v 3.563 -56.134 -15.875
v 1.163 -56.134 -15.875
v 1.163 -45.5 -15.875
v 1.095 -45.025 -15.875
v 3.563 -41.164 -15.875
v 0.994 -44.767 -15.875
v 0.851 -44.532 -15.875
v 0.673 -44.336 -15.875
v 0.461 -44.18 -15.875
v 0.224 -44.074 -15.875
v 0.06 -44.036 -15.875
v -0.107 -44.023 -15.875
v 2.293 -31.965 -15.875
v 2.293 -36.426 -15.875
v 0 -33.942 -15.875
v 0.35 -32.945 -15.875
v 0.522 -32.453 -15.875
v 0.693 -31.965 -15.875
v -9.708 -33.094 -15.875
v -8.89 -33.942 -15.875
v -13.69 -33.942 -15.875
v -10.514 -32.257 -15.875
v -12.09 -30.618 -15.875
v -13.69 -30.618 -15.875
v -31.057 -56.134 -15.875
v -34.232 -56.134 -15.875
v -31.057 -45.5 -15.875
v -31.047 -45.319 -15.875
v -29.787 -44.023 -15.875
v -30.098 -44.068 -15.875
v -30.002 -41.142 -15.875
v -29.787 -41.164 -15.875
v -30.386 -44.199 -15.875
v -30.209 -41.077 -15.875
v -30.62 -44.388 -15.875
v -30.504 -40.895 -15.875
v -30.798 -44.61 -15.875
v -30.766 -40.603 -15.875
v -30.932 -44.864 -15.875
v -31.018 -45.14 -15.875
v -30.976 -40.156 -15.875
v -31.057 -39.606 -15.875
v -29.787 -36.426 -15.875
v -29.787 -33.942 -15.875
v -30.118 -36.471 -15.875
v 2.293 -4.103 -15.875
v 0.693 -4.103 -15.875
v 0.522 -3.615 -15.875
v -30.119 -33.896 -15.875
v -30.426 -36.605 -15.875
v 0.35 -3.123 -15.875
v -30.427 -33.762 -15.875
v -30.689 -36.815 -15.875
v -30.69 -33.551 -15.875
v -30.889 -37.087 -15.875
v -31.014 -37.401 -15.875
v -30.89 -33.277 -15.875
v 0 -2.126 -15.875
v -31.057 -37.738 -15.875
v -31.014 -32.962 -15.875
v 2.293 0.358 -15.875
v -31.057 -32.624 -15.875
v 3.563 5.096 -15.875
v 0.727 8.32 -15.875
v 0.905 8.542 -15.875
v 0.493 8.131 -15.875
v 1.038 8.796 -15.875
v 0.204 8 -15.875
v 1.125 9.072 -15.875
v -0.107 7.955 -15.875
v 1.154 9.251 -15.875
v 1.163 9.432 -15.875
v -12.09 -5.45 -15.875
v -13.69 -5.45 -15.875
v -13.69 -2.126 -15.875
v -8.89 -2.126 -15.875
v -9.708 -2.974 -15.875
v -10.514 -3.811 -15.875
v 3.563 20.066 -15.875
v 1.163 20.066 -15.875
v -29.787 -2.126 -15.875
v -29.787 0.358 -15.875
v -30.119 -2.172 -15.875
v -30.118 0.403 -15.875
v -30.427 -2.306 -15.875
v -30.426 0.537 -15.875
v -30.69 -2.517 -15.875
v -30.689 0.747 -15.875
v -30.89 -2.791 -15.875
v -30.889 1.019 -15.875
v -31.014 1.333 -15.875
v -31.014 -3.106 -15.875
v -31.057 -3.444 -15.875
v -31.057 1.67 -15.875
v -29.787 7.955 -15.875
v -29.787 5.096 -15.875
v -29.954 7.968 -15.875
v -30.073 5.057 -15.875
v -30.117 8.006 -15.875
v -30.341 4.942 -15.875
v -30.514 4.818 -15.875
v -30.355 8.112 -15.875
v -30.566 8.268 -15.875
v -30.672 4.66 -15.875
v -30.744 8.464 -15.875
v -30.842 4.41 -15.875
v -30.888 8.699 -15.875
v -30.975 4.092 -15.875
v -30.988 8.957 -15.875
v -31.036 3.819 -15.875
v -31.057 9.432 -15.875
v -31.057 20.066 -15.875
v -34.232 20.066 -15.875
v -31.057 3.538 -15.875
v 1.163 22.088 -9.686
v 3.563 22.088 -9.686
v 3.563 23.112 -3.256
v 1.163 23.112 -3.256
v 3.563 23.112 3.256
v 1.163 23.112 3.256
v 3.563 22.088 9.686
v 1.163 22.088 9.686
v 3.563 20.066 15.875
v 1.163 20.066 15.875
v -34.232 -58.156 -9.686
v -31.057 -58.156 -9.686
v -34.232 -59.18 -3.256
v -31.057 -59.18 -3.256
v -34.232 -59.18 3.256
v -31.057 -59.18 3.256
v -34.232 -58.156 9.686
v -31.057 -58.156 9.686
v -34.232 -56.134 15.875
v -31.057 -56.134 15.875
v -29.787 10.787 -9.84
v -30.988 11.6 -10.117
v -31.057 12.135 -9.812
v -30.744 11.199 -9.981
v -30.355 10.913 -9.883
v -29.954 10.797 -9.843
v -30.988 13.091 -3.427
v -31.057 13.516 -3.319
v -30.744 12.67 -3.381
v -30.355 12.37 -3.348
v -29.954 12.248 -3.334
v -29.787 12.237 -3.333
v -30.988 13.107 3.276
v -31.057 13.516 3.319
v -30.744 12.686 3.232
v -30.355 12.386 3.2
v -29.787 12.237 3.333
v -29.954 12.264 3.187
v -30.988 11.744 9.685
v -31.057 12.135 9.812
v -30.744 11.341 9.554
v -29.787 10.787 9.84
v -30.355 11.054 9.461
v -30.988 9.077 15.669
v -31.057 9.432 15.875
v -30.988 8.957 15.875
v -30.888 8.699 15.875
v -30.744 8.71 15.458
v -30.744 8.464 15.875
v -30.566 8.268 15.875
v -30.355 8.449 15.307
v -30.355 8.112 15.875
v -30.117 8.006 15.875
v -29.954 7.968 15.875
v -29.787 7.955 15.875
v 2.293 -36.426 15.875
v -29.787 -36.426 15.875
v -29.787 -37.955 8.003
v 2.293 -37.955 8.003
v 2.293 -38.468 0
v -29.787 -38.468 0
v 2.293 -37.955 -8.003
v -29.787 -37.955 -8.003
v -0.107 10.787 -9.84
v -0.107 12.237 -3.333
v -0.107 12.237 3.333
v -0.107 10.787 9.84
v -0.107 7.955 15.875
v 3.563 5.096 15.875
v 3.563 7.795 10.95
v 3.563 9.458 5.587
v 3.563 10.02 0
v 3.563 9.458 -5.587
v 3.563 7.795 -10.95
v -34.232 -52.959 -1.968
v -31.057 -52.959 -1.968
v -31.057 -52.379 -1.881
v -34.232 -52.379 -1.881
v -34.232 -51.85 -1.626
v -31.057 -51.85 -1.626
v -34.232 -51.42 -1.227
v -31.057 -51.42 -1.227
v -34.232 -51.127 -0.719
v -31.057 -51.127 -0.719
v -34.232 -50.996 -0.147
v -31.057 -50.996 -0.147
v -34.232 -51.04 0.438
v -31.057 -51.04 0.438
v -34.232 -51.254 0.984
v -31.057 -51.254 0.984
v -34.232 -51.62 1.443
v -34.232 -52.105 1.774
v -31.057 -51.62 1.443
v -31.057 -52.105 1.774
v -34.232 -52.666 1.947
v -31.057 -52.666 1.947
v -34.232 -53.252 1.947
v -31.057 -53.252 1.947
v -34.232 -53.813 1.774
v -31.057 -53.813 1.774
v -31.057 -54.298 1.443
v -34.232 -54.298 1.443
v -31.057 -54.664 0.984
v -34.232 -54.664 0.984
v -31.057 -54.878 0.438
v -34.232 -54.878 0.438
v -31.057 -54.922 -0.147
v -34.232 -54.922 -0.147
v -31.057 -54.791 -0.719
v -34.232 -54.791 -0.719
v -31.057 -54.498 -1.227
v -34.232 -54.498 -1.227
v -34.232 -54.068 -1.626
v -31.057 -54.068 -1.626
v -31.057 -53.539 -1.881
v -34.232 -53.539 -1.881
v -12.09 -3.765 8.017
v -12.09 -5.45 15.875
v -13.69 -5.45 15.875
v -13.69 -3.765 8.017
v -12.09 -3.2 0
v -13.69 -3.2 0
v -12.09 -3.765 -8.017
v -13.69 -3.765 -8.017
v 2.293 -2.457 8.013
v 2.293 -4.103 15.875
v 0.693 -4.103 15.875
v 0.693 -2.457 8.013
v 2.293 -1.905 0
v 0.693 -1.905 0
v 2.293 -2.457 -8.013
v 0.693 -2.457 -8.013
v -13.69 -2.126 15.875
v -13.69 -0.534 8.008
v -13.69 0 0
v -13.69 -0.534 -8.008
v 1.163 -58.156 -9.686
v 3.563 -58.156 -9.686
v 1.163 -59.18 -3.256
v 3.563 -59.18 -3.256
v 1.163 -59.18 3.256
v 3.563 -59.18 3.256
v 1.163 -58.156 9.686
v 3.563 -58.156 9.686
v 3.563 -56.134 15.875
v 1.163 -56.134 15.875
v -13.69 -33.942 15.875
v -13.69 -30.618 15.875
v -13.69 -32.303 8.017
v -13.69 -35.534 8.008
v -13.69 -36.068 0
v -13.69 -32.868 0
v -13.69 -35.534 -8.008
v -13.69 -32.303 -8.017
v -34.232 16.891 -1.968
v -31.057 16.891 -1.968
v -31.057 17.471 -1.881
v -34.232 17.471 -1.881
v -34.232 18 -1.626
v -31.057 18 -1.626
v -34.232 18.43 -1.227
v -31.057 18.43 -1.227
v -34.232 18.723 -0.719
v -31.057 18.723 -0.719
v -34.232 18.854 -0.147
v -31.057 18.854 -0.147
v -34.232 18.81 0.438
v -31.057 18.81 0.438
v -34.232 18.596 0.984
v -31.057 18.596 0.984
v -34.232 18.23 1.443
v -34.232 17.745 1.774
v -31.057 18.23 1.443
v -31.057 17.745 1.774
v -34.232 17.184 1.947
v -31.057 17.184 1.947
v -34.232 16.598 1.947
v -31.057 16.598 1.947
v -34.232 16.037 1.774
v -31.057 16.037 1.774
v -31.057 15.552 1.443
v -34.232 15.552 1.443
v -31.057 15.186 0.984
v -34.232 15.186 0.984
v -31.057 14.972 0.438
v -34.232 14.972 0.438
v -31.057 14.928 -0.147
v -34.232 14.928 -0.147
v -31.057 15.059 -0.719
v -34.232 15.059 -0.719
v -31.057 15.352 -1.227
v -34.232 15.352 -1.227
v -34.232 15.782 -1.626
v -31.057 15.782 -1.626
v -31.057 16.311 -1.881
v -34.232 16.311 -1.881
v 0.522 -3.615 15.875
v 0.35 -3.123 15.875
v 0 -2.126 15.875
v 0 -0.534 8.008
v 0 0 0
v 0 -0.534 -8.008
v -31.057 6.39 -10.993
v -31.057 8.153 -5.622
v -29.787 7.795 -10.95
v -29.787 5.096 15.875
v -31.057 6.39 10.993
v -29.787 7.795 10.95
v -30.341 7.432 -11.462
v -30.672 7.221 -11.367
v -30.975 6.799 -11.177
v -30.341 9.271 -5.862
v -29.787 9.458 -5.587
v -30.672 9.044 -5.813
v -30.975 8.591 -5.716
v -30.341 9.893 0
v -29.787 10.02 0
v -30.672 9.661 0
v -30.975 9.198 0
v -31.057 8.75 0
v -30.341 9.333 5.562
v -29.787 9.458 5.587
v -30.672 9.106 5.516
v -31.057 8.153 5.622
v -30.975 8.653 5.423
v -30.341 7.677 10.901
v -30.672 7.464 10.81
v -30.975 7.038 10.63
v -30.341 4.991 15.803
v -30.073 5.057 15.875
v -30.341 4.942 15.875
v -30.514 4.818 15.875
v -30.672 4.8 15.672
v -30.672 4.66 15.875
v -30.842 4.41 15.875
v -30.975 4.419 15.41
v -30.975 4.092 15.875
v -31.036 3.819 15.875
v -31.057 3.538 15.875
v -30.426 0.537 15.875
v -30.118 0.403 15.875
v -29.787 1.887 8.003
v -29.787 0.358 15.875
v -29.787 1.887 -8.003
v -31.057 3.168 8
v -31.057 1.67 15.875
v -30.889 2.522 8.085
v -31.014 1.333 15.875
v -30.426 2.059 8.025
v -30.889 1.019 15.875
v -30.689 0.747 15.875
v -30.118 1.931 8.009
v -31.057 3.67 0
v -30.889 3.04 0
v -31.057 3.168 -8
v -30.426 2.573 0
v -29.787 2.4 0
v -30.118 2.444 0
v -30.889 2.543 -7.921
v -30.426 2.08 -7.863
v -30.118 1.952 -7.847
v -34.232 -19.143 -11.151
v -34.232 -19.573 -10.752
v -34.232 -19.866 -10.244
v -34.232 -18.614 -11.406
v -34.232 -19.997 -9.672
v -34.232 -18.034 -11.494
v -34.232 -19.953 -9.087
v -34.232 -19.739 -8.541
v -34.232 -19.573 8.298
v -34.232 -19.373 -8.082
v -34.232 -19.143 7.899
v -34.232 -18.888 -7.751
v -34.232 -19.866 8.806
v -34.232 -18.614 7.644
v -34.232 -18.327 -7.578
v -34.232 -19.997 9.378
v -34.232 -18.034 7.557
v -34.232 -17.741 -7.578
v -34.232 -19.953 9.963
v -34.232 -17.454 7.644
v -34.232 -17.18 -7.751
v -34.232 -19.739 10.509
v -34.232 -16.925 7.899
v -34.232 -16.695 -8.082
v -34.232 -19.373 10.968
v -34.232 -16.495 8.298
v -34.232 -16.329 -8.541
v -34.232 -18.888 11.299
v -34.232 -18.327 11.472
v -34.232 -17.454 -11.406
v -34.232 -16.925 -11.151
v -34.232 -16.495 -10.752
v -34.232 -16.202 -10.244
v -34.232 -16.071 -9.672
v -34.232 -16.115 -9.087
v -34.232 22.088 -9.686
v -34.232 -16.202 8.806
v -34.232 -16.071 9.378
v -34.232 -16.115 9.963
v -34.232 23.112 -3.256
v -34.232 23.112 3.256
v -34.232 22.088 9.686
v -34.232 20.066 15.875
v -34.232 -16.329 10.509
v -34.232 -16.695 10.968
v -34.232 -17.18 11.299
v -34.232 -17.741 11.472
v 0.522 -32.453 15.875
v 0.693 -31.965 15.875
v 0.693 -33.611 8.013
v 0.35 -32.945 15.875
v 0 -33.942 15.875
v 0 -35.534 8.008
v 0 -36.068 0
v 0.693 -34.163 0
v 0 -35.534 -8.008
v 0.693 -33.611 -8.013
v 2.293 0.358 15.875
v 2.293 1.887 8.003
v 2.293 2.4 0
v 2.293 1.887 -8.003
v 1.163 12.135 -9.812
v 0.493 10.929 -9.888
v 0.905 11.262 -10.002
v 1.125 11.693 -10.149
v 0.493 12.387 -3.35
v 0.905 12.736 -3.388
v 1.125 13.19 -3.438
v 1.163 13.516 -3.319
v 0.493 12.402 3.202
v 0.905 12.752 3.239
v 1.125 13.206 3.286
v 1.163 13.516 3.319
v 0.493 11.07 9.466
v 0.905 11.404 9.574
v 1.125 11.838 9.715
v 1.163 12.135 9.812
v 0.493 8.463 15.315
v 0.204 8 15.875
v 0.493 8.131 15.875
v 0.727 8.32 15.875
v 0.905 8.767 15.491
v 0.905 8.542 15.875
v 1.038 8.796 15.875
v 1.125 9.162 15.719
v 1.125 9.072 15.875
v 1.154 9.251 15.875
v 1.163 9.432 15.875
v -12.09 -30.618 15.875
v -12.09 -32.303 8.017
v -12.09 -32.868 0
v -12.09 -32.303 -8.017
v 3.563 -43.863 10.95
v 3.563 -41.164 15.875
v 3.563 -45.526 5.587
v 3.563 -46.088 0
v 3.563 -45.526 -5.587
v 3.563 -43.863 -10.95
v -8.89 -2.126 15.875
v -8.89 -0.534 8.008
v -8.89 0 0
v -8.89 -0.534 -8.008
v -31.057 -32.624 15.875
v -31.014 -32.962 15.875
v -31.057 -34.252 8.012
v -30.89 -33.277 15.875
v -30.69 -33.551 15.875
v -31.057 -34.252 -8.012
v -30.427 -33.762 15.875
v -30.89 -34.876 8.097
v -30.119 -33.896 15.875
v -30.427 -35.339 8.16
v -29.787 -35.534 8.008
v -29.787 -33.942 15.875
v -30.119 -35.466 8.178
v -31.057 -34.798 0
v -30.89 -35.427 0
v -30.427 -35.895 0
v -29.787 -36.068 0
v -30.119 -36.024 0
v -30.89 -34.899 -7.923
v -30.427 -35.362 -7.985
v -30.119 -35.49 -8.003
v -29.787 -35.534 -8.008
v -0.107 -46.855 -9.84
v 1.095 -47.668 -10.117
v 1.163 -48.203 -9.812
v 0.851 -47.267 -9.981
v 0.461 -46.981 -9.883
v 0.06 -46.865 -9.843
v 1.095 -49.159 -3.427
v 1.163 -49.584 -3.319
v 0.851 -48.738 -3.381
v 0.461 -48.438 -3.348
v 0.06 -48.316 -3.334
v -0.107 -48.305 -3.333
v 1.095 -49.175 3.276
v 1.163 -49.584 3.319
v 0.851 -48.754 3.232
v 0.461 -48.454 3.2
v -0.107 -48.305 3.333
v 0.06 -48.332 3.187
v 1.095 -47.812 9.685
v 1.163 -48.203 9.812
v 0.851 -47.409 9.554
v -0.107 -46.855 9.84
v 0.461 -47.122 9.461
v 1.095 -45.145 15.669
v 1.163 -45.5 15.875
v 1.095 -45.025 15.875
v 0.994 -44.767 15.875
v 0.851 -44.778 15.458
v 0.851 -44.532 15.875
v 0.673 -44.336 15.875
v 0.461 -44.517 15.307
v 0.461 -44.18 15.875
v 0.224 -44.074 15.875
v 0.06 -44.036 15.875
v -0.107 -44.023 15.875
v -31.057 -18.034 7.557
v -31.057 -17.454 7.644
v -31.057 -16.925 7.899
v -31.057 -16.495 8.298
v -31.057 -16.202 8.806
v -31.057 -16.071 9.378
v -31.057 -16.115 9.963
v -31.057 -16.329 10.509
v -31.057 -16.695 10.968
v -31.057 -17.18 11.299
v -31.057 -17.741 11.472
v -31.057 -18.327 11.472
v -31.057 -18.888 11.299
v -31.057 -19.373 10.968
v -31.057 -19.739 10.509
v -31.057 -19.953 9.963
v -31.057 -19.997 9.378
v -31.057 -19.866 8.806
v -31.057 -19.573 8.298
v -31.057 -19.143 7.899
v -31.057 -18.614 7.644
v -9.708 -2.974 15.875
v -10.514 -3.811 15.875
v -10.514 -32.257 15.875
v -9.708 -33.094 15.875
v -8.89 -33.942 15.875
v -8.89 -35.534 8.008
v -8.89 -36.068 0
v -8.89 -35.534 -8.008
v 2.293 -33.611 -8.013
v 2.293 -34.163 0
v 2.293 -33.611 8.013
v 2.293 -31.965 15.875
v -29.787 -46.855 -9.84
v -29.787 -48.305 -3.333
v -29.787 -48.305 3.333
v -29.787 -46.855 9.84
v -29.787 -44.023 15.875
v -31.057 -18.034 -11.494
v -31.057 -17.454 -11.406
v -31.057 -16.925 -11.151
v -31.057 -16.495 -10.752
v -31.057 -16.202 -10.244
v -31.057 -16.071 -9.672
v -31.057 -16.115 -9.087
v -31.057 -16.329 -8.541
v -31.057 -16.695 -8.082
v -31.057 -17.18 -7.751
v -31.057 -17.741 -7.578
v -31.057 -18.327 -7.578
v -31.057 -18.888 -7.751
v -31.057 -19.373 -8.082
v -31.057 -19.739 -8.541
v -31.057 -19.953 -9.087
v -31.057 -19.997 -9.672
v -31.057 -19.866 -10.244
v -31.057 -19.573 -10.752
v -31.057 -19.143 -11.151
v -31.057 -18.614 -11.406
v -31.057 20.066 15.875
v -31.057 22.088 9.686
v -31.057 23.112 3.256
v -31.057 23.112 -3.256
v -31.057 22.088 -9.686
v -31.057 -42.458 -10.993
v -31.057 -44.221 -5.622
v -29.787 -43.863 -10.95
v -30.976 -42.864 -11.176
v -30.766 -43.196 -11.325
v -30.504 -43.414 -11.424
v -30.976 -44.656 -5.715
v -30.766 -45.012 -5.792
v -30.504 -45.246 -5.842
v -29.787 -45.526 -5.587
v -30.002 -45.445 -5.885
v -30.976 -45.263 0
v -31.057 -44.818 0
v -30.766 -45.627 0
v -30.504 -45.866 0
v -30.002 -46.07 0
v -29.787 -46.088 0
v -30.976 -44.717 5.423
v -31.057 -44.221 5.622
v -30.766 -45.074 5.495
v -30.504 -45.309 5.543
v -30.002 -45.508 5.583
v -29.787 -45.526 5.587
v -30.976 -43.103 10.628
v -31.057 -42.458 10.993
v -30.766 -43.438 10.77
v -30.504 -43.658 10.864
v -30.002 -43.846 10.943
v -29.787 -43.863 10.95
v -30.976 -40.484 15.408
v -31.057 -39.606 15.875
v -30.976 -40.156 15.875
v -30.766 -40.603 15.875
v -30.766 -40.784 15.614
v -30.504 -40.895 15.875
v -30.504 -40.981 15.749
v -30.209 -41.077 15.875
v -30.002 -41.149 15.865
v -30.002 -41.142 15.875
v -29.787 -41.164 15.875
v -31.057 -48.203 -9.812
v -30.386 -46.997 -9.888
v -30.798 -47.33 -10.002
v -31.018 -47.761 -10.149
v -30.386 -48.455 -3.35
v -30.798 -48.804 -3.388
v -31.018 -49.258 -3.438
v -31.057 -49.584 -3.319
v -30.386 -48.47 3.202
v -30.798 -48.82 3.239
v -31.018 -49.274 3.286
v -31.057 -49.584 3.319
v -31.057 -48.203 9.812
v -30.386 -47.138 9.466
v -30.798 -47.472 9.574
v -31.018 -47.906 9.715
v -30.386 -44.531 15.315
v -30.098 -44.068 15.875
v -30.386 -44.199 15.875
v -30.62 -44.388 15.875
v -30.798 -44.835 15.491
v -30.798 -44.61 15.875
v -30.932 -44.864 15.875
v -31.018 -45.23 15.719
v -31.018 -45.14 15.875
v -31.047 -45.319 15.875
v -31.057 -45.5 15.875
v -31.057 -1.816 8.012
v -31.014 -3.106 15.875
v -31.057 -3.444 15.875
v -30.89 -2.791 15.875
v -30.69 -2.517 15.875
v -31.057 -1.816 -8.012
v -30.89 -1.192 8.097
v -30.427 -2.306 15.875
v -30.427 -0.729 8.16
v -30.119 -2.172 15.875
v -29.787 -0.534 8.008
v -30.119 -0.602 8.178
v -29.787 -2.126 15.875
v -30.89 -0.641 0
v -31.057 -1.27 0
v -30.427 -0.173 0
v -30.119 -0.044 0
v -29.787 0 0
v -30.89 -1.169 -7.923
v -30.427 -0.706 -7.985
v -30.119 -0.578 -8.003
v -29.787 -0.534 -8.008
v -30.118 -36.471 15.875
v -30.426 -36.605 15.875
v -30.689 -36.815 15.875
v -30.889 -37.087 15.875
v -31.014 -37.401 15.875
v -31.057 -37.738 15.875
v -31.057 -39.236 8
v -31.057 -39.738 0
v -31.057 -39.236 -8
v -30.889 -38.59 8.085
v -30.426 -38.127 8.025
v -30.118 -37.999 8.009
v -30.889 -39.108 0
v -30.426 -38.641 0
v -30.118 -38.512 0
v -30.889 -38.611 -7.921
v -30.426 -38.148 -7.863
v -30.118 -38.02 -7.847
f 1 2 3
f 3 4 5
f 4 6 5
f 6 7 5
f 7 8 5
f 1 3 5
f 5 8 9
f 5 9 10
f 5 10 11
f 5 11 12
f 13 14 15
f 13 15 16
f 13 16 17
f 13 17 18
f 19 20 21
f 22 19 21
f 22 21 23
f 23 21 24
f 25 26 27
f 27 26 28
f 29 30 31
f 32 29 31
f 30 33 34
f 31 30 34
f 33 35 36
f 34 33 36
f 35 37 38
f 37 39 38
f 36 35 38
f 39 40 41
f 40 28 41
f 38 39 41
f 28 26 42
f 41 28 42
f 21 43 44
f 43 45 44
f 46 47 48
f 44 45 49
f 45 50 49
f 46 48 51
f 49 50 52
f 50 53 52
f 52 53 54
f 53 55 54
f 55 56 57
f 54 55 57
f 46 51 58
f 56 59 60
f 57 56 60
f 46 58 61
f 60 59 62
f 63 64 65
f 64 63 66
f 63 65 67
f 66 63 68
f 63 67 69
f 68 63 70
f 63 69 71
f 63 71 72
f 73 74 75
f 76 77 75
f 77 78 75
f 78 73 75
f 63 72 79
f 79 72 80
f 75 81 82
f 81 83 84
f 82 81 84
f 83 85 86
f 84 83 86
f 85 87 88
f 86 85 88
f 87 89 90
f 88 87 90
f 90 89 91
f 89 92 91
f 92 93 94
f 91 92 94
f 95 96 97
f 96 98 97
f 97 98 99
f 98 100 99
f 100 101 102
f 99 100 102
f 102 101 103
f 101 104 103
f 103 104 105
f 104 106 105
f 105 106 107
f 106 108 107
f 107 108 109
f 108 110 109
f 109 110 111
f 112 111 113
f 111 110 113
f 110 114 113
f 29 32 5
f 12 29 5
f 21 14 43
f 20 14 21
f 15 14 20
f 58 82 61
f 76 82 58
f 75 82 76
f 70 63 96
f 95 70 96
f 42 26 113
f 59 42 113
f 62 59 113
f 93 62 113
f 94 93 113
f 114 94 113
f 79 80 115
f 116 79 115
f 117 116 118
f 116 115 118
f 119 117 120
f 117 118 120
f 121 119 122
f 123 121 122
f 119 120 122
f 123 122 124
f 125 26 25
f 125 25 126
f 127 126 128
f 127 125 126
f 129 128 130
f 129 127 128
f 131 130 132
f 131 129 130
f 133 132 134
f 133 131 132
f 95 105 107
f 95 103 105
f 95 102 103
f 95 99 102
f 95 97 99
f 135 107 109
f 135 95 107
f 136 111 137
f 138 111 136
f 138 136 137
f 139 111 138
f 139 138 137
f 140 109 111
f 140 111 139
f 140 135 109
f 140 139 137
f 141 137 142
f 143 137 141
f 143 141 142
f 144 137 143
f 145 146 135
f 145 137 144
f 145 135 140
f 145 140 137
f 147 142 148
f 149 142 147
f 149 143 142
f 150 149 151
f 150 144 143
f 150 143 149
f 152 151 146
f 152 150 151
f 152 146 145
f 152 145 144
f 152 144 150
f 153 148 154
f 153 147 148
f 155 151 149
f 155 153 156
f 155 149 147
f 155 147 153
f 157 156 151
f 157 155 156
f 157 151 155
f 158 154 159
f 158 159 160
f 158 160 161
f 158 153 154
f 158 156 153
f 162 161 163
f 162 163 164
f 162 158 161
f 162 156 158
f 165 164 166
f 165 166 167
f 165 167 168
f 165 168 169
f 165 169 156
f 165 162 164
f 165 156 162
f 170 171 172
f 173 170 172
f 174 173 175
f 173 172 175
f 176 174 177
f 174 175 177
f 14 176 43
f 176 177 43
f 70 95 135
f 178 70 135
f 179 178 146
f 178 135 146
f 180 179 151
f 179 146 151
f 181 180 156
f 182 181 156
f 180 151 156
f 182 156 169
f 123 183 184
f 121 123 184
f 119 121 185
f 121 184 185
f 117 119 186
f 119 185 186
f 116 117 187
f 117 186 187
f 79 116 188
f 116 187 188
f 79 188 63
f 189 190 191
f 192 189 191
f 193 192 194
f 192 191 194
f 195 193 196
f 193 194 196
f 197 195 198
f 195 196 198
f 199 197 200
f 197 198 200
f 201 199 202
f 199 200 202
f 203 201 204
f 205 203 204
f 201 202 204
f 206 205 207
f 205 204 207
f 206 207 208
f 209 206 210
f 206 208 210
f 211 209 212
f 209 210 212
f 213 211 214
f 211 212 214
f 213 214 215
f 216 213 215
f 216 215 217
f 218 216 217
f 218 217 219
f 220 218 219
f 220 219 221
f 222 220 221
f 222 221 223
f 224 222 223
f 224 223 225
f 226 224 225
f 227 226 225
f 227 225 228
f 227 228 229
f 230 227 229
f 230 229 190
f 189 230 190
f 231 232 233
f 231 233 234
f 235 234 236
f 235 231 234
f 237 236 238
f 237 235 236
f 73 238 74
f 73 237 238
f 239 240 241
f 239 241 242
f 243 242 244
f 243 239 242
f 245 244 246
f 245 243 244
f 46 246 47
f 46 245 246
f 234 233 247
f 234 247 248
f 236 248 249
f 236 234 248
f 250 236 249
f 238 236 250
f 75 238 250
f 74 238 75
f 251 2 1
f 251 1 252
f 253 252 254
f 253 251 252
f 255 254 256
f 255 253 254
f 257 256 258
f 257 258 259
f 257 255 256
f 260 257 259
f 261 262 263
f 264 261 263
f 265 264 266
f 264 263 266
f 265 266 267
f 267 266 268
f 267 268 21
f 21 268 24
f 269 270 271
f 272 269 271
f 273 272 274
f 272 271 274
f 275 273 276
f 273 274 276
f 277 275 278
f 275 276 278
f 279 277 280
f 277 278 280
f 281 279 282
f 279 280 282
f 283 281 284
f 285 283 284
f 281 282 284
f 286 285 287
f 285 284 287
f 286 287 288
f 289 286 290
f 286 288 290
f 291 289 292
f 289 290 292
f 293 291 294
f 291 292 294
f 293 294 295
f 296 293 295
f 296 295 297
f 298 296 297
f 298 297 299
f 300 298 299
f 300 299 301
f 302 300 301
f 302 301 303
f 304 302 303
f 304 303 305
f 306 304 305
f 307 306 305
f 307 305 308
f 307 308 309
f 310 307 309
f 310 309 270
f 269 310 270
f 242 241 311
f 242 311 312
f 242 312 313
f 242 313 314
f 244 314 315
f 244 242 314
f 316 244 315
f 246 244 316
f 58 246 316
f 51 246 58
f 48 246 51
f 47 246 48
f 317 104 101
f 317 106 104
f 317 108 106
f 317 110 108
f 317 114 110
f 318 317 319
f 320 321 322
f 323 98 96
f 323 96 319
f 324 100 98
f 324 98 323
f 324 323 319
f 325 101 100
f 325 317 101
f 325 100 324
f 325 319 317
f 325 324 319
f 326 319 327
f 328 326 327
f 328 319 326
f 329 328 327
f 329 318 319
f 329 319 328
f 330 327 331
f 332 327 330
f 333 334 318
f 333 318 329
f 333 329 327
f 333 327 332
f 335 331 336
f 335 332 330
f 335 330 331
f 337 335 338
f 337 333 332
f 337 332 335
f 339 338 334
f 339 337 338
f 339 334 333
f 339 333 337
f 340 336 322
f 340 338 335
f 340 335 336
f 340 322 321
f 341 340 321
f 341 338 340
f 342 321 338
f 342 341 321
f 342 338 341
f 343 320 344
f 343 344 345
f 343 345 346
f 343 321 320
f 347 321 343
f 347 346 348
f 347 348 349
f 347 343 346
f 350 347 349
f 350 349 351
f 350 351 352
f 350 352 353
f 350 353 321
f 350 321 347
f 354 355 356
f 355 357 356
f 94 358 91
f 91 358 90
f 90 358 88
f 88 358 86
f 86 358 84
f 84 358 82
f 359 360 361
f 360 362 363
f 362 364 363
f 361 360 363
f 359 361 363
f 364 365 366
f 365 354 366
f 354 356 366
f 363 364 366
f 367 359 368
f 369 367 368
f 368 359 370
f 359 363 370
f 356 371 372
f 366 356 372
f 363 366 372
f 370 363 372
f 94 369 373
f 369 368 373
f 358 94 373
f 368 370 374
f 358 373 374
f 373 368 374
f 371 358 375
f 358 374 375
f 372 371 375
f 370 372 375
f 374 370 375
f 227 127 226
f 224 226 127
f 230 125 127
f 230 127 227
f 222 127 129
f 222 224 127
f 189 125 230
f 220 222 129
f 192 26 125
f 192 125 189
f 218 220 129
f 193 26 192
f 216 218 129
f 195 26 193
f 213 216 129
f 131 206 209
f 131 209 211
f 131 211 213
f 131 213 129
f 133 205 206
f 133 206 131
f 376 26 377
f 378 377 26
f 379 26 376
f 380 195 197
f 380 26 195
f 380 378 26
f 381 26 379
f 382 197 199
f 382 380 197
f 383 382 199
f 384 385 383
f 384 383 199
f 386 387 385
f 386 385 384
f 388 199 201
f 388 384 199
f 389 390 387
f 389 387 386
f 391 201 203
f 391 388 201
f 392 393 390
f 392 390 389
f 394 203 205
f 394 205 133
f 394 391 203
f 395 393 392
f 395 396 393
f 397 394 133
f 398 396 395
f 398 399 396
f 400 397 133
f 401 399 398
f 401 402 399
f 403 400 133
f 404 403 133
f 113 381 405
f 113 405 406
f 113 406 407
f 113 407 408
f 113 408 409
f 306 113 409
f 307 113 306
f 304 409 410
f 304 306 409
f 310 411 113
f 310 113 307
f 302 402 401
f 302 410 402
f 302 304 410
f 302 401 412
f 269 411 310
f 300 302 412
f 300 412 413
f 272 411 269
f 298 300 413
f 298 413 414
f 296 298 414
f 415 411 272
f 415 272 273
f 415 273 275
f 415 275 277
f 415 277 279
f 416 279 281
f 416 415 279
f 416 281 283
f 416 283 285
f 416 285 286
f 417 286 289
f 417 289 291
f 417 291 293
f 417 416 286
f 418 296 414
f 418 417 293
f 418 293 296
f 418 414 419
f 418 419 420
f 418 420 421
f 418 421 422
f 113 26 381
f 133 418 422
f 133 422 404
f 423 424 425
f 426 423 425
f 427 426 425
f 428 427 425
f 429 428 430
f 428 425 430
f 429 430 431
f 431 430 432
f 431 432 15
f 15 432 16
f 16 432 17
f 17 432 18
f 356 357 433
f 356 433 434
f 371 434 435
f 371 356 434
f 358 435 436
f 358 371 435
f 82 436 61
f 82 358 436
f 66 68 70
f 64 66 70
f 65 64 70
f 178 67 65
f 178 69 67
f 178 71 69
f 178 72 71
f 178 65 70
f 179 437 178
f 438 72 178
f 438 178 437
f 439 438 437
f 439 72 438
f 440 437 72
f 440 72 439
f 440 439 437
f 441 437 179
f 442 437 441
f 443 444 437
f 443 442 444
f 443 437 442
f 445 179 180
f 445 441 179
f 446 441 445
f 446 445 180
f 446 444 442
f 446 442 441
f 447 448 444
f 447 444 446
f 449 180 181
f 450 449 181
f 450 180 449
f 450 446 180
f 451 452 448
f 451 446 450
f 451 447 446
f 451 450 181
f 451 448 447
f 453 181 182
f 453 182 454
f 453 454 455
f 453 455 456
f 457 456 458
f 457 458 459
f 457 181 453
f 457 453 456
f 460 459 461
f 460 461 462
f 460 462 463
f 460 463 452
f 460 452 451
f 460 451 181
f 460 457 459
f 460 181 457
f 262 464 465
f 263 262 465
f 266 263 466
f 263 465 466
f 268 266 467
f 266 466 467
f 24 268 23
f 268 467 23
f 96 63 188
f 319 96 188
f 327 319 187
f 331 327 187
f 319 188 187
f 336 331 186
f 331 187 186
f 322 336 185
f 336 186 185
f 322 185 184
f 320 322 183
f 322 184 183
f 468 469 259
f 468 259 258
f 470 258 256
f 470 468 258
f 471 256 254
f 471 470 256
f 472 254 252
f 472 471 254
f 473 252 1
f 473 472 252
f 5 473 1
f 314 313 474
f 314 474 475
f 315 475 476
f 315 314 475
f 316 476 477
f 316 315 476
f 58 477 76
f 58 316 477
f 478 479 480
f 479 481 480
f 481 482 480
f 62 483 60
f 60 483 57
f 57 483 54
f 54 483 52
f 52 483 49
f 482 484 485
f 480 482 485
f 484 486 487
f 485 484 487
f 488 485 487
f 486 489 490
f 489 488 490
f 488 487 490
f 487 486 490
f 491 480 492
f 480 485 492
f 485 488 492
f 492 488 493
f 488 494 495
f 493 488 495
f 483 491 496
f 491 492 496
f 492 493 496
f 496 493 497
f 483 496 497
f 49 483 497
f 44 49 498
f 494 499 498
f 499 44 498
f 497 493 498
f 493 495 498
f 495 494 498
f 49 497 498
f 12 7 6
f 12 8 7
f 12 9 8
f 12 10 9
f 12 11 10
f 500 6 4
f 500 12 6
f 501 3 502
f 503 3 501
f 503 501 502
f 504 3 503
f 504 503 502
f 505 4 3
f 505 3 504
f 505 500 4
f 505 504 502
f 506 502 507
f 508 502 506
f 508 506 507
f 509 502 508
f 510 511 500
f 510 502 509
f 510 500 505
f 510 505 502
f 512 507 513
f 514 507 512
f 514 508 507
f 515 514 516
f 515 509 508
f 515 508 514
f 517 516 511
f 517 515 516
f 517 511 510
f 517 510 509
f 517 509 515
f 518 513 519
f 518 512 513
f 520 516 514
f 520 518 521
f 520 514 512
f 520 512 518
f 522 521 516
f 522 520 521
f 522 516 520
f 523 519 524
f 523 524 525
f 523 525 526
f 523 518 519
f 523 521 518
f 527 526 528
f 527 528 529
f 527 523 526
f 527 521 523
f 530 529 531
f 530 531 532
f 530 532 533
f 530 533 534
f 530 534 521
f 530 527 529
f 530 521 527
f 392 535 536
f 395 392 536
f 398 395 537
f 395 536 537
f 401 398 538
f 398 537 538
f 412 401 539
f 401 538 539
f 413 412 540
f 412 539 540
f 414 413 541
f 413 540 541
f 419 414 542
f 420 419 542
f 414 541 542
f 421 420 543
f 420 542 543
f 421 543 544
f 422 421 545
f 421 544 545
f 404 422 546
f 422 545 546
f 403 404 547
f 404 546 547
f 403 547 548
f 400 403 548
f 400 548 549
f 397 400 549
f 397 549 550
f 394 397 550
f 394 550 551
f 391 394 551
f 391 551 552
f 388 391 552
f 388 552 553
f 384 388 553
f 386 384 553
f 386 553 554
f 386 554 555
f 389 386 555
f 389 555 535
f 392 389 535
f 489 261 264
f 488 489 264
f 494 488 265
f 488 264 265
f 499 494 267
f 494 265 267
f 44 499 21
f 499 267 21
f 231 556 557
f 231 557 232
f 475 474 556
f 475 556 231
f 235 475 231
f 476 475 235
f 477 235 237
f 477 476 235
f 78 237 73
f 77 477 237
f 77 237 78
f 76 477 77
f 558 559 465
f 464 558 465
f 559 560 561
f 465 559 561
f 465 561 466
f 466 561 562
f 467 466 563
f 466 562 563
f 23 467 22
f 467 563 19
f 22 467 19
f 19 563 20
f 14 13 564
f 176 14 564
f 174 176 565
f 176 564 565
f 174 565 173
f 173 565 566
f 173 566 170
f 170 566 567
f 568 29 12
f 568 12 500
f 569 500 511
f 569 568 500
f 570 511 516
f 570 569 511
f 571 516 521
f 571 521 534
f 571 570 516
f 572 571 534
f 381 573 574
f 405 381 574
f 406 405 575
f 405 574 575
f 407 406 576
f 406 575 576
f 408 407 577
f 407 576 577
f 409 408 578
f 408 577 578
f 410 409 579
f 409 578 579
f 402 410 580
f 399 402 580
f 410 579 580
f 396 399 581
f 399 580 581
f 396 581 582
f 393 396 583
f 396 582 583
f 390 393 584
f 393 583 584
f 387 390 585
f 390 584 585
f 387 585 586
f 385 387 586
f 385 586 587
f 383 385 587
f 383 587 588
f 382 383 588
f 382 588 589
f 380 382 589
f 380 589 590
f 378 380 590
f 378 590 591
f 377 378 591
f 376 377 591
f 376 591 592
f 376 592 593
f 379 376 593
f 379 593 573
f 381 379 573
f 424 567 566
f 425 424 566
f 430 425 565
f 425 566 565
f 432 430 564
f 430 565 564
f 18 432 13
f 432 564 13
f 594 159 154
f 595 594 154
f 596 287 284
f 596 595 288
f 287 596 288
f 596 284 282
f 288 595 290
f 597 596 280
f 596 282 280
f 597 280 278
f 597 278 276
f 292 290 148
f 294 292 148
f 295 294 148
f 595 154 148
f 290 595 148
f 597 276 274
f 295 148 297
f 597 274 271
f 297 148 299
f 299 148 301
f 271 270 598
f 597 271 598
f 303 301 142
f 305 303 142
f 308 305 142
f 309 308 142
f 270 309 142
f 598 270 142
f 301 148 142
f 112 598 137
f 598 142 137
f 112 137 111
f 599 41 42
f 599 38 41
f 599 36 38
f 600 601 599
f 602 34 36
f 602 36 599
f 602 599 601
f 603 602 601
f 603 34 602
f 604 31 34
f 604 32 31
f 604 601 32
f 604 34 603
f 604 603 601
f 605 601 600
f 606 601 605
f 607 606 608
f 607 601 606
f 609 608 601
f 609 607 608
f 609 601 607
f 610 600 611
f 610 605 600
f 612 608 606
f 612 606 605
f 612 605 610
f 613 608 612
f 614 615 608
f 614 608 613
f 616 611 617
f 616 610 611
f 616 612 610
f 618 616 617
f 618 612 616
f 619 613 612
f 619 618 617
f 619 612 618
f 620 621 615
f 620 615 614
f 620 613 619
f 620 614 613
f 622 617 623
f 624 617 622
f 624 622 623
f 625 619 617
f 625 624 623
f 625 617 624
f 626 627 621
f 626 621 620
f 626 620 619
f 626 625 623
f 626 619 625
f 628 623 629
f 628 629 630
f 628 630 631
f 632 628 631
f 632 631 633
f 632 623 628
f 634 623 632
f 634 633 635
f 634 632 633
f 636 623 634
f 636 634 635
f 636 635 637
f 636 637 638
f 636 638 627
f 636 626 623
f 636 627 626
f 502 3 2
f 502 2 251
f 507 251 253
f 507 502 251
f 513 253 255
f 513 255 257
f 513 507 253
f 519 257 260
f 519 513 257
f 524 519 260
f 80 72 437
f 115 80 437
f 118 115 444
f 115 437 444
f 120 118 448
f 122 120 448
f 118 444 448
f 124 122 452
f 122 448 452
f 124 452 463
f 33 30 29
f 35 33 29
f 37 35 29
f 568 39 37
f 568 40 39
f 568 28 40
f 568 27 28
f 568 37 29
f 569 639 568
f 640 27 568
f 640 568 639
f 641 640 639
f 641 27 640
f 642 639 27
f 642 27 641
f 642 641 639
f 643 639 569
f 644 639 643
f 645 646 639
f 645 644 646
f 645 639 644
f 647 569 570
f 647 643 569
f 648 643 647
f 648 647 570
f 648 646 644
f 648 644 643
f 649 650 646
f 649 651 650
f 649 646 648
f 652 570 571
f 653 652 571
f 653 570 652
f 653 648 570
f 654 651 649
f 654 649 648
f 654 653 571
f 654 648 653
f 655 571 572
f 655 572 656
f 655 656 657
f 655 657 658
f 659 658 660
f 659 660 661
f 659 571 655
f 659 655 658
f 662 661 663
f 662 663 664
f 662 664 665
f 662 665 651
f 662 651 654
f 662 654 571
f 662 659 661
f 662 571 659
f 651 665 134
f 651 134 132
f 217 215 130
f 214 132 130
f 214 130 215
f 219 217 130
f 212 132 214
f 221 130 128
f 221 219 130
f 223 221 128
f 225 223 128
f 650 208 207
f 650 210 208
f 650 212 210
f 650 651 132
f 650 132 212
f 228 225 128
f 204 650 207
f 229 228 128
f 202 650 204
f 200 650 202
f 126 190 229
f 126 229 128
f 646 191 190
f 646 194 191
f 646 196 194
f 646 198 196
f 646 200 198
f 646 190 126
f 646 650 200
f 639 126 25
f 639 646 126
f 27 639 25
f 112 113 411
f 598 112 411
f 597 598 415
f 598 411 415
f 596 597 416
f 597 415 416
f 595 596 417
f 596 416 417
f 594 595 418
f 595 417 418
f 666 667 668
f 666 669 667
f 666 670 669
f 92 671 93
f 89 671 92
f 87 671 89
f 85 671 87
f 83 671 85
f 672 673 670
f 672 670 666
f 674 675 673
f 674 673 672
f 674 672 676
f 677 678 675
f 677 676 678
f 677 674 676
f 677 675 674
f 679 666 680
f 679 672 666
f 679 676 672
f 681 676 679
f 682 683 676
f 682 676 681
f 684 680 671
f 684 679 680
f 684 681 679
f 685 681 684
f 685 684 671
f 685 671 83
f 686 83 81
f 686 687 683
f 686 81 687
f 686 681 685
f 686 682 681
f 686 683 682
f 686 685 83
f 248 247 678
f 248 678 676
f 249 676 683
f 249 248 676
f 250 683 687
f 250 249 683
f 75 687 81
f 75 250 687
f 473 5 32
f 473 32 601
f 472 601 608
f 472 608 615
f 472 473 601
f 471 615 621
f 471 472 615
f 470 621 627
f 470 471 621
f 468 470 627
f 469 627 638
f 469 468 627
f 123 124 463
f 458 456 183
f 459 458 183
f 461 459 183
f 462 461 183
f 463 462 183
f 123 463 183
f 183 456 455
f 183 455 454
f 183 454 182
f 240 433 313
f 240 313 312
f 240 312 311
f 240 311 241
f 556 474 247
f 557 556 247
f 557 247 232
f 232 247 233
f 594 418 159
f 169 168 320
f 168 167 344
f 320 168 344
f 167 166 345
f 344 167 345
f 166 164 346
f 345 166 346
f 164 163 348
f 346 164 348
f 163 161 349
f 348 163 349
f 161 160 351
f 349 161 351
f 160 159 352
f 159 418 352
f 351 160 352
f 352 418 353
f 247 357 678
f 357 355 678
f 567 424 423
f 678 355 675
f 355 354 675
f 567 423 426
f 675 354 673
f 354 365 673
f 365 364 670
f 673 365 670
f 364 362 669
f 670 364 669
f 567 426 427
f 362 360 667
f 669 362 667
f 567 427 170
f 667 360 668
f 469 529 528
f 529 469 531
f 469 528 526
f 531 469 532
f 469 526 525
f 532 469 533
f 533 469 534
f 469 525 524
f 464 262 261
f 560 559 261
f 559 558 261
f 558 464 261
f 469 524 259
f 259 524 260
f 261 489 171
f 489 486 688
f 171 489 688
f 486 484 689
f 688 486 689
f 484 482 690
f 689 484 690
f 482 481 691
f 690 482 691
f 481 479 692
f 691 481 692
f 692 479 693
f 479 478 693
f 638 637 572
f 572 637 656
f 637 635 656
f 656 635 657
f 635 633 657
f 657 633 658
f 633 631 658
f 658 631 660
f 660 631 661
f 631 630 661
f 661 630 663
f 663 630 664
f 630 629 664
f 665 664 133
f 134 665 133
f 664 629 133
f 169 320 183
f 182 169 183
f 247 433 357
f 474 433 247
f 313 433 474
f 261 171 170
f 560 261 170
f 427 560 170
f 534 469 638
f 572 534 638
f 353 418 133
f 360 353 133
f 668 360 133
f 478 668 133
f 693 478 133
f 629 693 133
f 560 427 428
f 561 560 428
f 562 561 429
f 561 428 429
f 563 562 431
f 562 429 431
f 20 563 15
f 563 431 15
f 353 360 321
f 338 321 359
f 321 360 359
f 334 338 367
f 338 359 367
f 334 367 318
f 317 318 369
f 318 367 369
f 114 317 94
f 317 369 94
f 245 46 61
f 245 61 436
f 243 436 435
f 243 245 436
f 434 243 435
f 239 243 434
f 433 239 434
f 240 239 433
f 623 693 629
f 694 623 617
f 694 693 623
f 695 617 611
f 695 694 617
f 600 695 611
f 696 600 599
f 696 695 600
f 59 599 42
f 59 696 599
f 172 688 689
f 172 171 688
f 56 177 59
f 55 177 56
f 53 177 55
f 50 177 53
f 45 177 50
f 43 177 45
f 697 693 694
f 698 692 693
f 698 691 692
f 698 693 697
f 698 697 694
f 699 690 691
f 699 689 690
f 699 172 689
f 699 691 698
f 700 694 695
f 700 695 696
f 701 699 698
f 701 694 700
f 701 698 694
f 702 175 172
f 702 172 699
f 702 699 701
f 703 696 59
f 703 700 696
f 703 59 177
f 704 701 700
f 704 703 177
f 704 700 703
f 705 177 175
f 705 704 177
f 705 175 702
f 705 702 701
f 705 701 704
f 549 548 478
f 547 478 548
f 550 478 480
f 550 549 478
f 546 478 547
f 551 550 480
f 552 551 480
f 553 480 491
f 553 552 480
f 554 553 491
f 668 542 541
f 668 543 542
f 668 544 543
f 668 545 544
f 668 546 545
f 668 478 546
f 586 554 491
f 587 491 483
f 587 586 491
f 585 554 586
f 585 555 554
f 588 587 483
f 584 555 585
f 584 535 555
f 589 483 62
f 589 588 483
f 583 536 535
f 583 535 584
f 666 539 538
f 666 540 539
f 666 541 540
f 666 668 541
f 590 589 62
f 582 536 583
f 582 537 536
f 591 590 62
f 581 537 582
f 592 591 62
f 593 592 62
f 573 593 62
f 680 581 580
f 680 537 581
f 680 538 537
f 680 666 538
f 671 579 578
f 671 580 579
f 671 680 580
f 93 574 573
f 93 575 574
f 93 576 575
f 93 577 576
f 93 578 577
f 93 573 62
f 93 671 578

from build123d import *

# Parameters (mm, degrees)
SKETCH2_OUTSIDE_W           = 163.676
SKETCH2_OUTSIDE_H           = 163.676
SKETCH2_OUTSIDE_W_2         = 31.75
SKETCH2_OUTSIDE_H_2         = 36.068
CUT_EXTRUDE1_DEPTH          = 143.862884438
FILLET1_R                   = 1.27
FILLET2_R                   = 2.54
RINGCUT_EXTRUDE3_DEPTH      = 81.964552311
RINGCUT_EXTRUDE3_DEPTH_BACK = 81.964552311
SKETCH6_OUTSIDE_W           = 109.092
SKETCH6_OUTSIDE_H           = 109.092
SKETCH4_R                   = 1.9685
CUT_EXTRUDE2_DEPTH          = 71.484874378
RINGFILLET4_R               = 1.27
SKETCH7_R                   = 1.9685
CUT_EXTRUDE4_DEPTH          = 71.484874378


with BuildPart() as part:
    # Sketch1 → Revolve1 (revolve)
    with BuildSketch(Plane.XY, mode=Mode.PRIVATE) as revolve1_sk:
        Polygon((0, 0), (0.693363296, -1.905), (2.293363296, -1.905), (2.293363296, 2.4), (-34.231636704, 2.4), (-34.231636704, -60.325), (-31.056636704, -60.325), (-31.056636704, 0), (-13.69, 0), (-13.69, -3.2), (-12.09, -3.2), (-8.89, 0), align=None)
    revolve(revolve1_sk.sketch.rotate(Axis((-31.056636704, -60.325, 0), (-1, 0, 0)), 90), axis=Axis((-31.056636704, -60.325, 0), (-1, 0, 0)))

    # Sketch2 outside → Cut-Extrude1 (cut, through all)
    with BuildSketch(Plane(origin=(2.293363296, 0, 0), x_dir=(0, 0, -1), z_dir=(1, 0, 0))):
        with Locations((0, -60.325)):
            Rectangle(SKETCH2_OUTSIDE_W, SKETCH2_OUTSIDE_H)
        Rectangle(SKETCH2_OUTSIDE_W_2, SKETCH2_OUTSIDE_H_2, mode=Mode.SUBTRACT)
    extrude(amount=-CUT_EXTRUDE1_DEPTH, mode=Mode.SUBTRACT)

    # Fillet1
    fillet1_edges = [part.edges().sort_by_distance(p)[0] for p in [
        (-31.056636704, 0, 0),
    ]]
    fillet(fillet1_edges, radius=FILLET1_R)

    # Fillet2
    fillet2_edges = [part.edges().sort_by_distance(p)[0] for p in [
        (-34.231636704, 2.4, 0),
    ]]
    fillet(fillet2_edges, radius=FILLET2_R)

    # Sketch5 → RingRevolve2 (revolve)
    with BuildSketch(Plane.XY, mode=Mode.PRIVATE) as ringrevolve2_sk:
        Polygon((-31.056636704, -3.443742982), (-31.056636704, 10.02), (3.563363296, 10.02), (3.563363296, 23.241), (1.163363296, 23.241), (1.163363296, 12.42), (-31.056636704, 12.42), (-31.056636704, 23.241), (-34.231636704, 23.241), (-34.231636704, 11.15), (-34.231636704, -3.443742982), align=None)
    revolve(ringrevolve2_sk.sketch.rotate(Axis((-34.231636704, -18.034, 0), (1, 0, 0)), 90), axis=Axis((-34.231636704, -18.034, 0), (1, 0, 0)))

    # Sketch6 outside → RingCut-Extrude3 (cut, two sides: drawn at the far end of the back side and taken through both)
    with BuildSketch(Plane(origin=(2.293363296, 0, 0), x_dir=(0, 0, -1), z_dir=(1, 0, 0)).offset(-RINGCUT_EXTRUDE3_DEPTH_BACK)):
        with Locations((0, -18.034)):
            Rectangle(SKETCH6_OUTSIDE_W, SKETCH6_OUTSIDE_H)
        Polygon((-15.875, 0.357864138), (-15.875, -18.034), (15.875, -18.034), (15.875, 0.357864138), (15.875, 24.013762752), (-15.875, 24.013762752), align=None, mode=Mode.SUBTRACT)
    extrude(amount=RINGCUT_EXTRUDE3_DEPTH + RINGCUT_EXTRUDE3_DEPTH_BACK, mode=Mode.SUBTRACT)

    # Mirror1: part across plane


with BuildPart() as part_1:
    add(part.part)
    add(part.part.mirror(Plane(origin=(-34.231636704, -18.034, 15.875), x_dir=(0, 0, 1), z_dir=(0, -1, 0))))

    # Sketch4 → Cut-Extrude2 (cut, through all)
    with BuildSketch(Plane(origin=(-31.056636704, 0, 0), x_dir=(0, 0, -1), z_dir=(1, 0, 0))):
        with Locations((-9.525, -18.034)):
            Circle(SKETCH4_R)
        with Locations((9.525, -18.034)):
            Circle(SKETCH4_R)
    extrude(amount=-CUT_EXTRUDE2_DEPTH, mode=Mode.SUBTRACT)

    # RingFillet4
    ringfillet4_edges = [part_1.edges().sort_by_distance(p)[0] for p in [
        (-31.056636704, -38.468, 0),
        (-31.056636704, -46.088, 0),
        (1.163363296, -48.488, 0),
        (-31.056636704, -48.488, 0),
        (-31.056636704, 2.4, 0),
        (-31.056636704, 10.02, 0),
        (1.163363296, 12.42, 0),
        (-31.056636704, 12.42, 0),
    ]]
    fillet(ringfillet4_edges, radius=RINGFILLET4_R)

    # Sketch7 → Cut-Extrude4 (cut, through all)
    with BuildSketch(Plane(origin=(-31.056636704, 0, 0), x_dir=(0, 0, -1), z_dir=(1, 0, 0))):
        with Locations((0, 16.891)):
            Circle(SKETCH7_R)
        with Locations((0, -52.959)):
            Circle(SKETCH7_R)
    extrude(amount=-CUT_EXTRUDE4_DEPTH, mode=Mode.SUBTRACT)


solid = part_1.part
